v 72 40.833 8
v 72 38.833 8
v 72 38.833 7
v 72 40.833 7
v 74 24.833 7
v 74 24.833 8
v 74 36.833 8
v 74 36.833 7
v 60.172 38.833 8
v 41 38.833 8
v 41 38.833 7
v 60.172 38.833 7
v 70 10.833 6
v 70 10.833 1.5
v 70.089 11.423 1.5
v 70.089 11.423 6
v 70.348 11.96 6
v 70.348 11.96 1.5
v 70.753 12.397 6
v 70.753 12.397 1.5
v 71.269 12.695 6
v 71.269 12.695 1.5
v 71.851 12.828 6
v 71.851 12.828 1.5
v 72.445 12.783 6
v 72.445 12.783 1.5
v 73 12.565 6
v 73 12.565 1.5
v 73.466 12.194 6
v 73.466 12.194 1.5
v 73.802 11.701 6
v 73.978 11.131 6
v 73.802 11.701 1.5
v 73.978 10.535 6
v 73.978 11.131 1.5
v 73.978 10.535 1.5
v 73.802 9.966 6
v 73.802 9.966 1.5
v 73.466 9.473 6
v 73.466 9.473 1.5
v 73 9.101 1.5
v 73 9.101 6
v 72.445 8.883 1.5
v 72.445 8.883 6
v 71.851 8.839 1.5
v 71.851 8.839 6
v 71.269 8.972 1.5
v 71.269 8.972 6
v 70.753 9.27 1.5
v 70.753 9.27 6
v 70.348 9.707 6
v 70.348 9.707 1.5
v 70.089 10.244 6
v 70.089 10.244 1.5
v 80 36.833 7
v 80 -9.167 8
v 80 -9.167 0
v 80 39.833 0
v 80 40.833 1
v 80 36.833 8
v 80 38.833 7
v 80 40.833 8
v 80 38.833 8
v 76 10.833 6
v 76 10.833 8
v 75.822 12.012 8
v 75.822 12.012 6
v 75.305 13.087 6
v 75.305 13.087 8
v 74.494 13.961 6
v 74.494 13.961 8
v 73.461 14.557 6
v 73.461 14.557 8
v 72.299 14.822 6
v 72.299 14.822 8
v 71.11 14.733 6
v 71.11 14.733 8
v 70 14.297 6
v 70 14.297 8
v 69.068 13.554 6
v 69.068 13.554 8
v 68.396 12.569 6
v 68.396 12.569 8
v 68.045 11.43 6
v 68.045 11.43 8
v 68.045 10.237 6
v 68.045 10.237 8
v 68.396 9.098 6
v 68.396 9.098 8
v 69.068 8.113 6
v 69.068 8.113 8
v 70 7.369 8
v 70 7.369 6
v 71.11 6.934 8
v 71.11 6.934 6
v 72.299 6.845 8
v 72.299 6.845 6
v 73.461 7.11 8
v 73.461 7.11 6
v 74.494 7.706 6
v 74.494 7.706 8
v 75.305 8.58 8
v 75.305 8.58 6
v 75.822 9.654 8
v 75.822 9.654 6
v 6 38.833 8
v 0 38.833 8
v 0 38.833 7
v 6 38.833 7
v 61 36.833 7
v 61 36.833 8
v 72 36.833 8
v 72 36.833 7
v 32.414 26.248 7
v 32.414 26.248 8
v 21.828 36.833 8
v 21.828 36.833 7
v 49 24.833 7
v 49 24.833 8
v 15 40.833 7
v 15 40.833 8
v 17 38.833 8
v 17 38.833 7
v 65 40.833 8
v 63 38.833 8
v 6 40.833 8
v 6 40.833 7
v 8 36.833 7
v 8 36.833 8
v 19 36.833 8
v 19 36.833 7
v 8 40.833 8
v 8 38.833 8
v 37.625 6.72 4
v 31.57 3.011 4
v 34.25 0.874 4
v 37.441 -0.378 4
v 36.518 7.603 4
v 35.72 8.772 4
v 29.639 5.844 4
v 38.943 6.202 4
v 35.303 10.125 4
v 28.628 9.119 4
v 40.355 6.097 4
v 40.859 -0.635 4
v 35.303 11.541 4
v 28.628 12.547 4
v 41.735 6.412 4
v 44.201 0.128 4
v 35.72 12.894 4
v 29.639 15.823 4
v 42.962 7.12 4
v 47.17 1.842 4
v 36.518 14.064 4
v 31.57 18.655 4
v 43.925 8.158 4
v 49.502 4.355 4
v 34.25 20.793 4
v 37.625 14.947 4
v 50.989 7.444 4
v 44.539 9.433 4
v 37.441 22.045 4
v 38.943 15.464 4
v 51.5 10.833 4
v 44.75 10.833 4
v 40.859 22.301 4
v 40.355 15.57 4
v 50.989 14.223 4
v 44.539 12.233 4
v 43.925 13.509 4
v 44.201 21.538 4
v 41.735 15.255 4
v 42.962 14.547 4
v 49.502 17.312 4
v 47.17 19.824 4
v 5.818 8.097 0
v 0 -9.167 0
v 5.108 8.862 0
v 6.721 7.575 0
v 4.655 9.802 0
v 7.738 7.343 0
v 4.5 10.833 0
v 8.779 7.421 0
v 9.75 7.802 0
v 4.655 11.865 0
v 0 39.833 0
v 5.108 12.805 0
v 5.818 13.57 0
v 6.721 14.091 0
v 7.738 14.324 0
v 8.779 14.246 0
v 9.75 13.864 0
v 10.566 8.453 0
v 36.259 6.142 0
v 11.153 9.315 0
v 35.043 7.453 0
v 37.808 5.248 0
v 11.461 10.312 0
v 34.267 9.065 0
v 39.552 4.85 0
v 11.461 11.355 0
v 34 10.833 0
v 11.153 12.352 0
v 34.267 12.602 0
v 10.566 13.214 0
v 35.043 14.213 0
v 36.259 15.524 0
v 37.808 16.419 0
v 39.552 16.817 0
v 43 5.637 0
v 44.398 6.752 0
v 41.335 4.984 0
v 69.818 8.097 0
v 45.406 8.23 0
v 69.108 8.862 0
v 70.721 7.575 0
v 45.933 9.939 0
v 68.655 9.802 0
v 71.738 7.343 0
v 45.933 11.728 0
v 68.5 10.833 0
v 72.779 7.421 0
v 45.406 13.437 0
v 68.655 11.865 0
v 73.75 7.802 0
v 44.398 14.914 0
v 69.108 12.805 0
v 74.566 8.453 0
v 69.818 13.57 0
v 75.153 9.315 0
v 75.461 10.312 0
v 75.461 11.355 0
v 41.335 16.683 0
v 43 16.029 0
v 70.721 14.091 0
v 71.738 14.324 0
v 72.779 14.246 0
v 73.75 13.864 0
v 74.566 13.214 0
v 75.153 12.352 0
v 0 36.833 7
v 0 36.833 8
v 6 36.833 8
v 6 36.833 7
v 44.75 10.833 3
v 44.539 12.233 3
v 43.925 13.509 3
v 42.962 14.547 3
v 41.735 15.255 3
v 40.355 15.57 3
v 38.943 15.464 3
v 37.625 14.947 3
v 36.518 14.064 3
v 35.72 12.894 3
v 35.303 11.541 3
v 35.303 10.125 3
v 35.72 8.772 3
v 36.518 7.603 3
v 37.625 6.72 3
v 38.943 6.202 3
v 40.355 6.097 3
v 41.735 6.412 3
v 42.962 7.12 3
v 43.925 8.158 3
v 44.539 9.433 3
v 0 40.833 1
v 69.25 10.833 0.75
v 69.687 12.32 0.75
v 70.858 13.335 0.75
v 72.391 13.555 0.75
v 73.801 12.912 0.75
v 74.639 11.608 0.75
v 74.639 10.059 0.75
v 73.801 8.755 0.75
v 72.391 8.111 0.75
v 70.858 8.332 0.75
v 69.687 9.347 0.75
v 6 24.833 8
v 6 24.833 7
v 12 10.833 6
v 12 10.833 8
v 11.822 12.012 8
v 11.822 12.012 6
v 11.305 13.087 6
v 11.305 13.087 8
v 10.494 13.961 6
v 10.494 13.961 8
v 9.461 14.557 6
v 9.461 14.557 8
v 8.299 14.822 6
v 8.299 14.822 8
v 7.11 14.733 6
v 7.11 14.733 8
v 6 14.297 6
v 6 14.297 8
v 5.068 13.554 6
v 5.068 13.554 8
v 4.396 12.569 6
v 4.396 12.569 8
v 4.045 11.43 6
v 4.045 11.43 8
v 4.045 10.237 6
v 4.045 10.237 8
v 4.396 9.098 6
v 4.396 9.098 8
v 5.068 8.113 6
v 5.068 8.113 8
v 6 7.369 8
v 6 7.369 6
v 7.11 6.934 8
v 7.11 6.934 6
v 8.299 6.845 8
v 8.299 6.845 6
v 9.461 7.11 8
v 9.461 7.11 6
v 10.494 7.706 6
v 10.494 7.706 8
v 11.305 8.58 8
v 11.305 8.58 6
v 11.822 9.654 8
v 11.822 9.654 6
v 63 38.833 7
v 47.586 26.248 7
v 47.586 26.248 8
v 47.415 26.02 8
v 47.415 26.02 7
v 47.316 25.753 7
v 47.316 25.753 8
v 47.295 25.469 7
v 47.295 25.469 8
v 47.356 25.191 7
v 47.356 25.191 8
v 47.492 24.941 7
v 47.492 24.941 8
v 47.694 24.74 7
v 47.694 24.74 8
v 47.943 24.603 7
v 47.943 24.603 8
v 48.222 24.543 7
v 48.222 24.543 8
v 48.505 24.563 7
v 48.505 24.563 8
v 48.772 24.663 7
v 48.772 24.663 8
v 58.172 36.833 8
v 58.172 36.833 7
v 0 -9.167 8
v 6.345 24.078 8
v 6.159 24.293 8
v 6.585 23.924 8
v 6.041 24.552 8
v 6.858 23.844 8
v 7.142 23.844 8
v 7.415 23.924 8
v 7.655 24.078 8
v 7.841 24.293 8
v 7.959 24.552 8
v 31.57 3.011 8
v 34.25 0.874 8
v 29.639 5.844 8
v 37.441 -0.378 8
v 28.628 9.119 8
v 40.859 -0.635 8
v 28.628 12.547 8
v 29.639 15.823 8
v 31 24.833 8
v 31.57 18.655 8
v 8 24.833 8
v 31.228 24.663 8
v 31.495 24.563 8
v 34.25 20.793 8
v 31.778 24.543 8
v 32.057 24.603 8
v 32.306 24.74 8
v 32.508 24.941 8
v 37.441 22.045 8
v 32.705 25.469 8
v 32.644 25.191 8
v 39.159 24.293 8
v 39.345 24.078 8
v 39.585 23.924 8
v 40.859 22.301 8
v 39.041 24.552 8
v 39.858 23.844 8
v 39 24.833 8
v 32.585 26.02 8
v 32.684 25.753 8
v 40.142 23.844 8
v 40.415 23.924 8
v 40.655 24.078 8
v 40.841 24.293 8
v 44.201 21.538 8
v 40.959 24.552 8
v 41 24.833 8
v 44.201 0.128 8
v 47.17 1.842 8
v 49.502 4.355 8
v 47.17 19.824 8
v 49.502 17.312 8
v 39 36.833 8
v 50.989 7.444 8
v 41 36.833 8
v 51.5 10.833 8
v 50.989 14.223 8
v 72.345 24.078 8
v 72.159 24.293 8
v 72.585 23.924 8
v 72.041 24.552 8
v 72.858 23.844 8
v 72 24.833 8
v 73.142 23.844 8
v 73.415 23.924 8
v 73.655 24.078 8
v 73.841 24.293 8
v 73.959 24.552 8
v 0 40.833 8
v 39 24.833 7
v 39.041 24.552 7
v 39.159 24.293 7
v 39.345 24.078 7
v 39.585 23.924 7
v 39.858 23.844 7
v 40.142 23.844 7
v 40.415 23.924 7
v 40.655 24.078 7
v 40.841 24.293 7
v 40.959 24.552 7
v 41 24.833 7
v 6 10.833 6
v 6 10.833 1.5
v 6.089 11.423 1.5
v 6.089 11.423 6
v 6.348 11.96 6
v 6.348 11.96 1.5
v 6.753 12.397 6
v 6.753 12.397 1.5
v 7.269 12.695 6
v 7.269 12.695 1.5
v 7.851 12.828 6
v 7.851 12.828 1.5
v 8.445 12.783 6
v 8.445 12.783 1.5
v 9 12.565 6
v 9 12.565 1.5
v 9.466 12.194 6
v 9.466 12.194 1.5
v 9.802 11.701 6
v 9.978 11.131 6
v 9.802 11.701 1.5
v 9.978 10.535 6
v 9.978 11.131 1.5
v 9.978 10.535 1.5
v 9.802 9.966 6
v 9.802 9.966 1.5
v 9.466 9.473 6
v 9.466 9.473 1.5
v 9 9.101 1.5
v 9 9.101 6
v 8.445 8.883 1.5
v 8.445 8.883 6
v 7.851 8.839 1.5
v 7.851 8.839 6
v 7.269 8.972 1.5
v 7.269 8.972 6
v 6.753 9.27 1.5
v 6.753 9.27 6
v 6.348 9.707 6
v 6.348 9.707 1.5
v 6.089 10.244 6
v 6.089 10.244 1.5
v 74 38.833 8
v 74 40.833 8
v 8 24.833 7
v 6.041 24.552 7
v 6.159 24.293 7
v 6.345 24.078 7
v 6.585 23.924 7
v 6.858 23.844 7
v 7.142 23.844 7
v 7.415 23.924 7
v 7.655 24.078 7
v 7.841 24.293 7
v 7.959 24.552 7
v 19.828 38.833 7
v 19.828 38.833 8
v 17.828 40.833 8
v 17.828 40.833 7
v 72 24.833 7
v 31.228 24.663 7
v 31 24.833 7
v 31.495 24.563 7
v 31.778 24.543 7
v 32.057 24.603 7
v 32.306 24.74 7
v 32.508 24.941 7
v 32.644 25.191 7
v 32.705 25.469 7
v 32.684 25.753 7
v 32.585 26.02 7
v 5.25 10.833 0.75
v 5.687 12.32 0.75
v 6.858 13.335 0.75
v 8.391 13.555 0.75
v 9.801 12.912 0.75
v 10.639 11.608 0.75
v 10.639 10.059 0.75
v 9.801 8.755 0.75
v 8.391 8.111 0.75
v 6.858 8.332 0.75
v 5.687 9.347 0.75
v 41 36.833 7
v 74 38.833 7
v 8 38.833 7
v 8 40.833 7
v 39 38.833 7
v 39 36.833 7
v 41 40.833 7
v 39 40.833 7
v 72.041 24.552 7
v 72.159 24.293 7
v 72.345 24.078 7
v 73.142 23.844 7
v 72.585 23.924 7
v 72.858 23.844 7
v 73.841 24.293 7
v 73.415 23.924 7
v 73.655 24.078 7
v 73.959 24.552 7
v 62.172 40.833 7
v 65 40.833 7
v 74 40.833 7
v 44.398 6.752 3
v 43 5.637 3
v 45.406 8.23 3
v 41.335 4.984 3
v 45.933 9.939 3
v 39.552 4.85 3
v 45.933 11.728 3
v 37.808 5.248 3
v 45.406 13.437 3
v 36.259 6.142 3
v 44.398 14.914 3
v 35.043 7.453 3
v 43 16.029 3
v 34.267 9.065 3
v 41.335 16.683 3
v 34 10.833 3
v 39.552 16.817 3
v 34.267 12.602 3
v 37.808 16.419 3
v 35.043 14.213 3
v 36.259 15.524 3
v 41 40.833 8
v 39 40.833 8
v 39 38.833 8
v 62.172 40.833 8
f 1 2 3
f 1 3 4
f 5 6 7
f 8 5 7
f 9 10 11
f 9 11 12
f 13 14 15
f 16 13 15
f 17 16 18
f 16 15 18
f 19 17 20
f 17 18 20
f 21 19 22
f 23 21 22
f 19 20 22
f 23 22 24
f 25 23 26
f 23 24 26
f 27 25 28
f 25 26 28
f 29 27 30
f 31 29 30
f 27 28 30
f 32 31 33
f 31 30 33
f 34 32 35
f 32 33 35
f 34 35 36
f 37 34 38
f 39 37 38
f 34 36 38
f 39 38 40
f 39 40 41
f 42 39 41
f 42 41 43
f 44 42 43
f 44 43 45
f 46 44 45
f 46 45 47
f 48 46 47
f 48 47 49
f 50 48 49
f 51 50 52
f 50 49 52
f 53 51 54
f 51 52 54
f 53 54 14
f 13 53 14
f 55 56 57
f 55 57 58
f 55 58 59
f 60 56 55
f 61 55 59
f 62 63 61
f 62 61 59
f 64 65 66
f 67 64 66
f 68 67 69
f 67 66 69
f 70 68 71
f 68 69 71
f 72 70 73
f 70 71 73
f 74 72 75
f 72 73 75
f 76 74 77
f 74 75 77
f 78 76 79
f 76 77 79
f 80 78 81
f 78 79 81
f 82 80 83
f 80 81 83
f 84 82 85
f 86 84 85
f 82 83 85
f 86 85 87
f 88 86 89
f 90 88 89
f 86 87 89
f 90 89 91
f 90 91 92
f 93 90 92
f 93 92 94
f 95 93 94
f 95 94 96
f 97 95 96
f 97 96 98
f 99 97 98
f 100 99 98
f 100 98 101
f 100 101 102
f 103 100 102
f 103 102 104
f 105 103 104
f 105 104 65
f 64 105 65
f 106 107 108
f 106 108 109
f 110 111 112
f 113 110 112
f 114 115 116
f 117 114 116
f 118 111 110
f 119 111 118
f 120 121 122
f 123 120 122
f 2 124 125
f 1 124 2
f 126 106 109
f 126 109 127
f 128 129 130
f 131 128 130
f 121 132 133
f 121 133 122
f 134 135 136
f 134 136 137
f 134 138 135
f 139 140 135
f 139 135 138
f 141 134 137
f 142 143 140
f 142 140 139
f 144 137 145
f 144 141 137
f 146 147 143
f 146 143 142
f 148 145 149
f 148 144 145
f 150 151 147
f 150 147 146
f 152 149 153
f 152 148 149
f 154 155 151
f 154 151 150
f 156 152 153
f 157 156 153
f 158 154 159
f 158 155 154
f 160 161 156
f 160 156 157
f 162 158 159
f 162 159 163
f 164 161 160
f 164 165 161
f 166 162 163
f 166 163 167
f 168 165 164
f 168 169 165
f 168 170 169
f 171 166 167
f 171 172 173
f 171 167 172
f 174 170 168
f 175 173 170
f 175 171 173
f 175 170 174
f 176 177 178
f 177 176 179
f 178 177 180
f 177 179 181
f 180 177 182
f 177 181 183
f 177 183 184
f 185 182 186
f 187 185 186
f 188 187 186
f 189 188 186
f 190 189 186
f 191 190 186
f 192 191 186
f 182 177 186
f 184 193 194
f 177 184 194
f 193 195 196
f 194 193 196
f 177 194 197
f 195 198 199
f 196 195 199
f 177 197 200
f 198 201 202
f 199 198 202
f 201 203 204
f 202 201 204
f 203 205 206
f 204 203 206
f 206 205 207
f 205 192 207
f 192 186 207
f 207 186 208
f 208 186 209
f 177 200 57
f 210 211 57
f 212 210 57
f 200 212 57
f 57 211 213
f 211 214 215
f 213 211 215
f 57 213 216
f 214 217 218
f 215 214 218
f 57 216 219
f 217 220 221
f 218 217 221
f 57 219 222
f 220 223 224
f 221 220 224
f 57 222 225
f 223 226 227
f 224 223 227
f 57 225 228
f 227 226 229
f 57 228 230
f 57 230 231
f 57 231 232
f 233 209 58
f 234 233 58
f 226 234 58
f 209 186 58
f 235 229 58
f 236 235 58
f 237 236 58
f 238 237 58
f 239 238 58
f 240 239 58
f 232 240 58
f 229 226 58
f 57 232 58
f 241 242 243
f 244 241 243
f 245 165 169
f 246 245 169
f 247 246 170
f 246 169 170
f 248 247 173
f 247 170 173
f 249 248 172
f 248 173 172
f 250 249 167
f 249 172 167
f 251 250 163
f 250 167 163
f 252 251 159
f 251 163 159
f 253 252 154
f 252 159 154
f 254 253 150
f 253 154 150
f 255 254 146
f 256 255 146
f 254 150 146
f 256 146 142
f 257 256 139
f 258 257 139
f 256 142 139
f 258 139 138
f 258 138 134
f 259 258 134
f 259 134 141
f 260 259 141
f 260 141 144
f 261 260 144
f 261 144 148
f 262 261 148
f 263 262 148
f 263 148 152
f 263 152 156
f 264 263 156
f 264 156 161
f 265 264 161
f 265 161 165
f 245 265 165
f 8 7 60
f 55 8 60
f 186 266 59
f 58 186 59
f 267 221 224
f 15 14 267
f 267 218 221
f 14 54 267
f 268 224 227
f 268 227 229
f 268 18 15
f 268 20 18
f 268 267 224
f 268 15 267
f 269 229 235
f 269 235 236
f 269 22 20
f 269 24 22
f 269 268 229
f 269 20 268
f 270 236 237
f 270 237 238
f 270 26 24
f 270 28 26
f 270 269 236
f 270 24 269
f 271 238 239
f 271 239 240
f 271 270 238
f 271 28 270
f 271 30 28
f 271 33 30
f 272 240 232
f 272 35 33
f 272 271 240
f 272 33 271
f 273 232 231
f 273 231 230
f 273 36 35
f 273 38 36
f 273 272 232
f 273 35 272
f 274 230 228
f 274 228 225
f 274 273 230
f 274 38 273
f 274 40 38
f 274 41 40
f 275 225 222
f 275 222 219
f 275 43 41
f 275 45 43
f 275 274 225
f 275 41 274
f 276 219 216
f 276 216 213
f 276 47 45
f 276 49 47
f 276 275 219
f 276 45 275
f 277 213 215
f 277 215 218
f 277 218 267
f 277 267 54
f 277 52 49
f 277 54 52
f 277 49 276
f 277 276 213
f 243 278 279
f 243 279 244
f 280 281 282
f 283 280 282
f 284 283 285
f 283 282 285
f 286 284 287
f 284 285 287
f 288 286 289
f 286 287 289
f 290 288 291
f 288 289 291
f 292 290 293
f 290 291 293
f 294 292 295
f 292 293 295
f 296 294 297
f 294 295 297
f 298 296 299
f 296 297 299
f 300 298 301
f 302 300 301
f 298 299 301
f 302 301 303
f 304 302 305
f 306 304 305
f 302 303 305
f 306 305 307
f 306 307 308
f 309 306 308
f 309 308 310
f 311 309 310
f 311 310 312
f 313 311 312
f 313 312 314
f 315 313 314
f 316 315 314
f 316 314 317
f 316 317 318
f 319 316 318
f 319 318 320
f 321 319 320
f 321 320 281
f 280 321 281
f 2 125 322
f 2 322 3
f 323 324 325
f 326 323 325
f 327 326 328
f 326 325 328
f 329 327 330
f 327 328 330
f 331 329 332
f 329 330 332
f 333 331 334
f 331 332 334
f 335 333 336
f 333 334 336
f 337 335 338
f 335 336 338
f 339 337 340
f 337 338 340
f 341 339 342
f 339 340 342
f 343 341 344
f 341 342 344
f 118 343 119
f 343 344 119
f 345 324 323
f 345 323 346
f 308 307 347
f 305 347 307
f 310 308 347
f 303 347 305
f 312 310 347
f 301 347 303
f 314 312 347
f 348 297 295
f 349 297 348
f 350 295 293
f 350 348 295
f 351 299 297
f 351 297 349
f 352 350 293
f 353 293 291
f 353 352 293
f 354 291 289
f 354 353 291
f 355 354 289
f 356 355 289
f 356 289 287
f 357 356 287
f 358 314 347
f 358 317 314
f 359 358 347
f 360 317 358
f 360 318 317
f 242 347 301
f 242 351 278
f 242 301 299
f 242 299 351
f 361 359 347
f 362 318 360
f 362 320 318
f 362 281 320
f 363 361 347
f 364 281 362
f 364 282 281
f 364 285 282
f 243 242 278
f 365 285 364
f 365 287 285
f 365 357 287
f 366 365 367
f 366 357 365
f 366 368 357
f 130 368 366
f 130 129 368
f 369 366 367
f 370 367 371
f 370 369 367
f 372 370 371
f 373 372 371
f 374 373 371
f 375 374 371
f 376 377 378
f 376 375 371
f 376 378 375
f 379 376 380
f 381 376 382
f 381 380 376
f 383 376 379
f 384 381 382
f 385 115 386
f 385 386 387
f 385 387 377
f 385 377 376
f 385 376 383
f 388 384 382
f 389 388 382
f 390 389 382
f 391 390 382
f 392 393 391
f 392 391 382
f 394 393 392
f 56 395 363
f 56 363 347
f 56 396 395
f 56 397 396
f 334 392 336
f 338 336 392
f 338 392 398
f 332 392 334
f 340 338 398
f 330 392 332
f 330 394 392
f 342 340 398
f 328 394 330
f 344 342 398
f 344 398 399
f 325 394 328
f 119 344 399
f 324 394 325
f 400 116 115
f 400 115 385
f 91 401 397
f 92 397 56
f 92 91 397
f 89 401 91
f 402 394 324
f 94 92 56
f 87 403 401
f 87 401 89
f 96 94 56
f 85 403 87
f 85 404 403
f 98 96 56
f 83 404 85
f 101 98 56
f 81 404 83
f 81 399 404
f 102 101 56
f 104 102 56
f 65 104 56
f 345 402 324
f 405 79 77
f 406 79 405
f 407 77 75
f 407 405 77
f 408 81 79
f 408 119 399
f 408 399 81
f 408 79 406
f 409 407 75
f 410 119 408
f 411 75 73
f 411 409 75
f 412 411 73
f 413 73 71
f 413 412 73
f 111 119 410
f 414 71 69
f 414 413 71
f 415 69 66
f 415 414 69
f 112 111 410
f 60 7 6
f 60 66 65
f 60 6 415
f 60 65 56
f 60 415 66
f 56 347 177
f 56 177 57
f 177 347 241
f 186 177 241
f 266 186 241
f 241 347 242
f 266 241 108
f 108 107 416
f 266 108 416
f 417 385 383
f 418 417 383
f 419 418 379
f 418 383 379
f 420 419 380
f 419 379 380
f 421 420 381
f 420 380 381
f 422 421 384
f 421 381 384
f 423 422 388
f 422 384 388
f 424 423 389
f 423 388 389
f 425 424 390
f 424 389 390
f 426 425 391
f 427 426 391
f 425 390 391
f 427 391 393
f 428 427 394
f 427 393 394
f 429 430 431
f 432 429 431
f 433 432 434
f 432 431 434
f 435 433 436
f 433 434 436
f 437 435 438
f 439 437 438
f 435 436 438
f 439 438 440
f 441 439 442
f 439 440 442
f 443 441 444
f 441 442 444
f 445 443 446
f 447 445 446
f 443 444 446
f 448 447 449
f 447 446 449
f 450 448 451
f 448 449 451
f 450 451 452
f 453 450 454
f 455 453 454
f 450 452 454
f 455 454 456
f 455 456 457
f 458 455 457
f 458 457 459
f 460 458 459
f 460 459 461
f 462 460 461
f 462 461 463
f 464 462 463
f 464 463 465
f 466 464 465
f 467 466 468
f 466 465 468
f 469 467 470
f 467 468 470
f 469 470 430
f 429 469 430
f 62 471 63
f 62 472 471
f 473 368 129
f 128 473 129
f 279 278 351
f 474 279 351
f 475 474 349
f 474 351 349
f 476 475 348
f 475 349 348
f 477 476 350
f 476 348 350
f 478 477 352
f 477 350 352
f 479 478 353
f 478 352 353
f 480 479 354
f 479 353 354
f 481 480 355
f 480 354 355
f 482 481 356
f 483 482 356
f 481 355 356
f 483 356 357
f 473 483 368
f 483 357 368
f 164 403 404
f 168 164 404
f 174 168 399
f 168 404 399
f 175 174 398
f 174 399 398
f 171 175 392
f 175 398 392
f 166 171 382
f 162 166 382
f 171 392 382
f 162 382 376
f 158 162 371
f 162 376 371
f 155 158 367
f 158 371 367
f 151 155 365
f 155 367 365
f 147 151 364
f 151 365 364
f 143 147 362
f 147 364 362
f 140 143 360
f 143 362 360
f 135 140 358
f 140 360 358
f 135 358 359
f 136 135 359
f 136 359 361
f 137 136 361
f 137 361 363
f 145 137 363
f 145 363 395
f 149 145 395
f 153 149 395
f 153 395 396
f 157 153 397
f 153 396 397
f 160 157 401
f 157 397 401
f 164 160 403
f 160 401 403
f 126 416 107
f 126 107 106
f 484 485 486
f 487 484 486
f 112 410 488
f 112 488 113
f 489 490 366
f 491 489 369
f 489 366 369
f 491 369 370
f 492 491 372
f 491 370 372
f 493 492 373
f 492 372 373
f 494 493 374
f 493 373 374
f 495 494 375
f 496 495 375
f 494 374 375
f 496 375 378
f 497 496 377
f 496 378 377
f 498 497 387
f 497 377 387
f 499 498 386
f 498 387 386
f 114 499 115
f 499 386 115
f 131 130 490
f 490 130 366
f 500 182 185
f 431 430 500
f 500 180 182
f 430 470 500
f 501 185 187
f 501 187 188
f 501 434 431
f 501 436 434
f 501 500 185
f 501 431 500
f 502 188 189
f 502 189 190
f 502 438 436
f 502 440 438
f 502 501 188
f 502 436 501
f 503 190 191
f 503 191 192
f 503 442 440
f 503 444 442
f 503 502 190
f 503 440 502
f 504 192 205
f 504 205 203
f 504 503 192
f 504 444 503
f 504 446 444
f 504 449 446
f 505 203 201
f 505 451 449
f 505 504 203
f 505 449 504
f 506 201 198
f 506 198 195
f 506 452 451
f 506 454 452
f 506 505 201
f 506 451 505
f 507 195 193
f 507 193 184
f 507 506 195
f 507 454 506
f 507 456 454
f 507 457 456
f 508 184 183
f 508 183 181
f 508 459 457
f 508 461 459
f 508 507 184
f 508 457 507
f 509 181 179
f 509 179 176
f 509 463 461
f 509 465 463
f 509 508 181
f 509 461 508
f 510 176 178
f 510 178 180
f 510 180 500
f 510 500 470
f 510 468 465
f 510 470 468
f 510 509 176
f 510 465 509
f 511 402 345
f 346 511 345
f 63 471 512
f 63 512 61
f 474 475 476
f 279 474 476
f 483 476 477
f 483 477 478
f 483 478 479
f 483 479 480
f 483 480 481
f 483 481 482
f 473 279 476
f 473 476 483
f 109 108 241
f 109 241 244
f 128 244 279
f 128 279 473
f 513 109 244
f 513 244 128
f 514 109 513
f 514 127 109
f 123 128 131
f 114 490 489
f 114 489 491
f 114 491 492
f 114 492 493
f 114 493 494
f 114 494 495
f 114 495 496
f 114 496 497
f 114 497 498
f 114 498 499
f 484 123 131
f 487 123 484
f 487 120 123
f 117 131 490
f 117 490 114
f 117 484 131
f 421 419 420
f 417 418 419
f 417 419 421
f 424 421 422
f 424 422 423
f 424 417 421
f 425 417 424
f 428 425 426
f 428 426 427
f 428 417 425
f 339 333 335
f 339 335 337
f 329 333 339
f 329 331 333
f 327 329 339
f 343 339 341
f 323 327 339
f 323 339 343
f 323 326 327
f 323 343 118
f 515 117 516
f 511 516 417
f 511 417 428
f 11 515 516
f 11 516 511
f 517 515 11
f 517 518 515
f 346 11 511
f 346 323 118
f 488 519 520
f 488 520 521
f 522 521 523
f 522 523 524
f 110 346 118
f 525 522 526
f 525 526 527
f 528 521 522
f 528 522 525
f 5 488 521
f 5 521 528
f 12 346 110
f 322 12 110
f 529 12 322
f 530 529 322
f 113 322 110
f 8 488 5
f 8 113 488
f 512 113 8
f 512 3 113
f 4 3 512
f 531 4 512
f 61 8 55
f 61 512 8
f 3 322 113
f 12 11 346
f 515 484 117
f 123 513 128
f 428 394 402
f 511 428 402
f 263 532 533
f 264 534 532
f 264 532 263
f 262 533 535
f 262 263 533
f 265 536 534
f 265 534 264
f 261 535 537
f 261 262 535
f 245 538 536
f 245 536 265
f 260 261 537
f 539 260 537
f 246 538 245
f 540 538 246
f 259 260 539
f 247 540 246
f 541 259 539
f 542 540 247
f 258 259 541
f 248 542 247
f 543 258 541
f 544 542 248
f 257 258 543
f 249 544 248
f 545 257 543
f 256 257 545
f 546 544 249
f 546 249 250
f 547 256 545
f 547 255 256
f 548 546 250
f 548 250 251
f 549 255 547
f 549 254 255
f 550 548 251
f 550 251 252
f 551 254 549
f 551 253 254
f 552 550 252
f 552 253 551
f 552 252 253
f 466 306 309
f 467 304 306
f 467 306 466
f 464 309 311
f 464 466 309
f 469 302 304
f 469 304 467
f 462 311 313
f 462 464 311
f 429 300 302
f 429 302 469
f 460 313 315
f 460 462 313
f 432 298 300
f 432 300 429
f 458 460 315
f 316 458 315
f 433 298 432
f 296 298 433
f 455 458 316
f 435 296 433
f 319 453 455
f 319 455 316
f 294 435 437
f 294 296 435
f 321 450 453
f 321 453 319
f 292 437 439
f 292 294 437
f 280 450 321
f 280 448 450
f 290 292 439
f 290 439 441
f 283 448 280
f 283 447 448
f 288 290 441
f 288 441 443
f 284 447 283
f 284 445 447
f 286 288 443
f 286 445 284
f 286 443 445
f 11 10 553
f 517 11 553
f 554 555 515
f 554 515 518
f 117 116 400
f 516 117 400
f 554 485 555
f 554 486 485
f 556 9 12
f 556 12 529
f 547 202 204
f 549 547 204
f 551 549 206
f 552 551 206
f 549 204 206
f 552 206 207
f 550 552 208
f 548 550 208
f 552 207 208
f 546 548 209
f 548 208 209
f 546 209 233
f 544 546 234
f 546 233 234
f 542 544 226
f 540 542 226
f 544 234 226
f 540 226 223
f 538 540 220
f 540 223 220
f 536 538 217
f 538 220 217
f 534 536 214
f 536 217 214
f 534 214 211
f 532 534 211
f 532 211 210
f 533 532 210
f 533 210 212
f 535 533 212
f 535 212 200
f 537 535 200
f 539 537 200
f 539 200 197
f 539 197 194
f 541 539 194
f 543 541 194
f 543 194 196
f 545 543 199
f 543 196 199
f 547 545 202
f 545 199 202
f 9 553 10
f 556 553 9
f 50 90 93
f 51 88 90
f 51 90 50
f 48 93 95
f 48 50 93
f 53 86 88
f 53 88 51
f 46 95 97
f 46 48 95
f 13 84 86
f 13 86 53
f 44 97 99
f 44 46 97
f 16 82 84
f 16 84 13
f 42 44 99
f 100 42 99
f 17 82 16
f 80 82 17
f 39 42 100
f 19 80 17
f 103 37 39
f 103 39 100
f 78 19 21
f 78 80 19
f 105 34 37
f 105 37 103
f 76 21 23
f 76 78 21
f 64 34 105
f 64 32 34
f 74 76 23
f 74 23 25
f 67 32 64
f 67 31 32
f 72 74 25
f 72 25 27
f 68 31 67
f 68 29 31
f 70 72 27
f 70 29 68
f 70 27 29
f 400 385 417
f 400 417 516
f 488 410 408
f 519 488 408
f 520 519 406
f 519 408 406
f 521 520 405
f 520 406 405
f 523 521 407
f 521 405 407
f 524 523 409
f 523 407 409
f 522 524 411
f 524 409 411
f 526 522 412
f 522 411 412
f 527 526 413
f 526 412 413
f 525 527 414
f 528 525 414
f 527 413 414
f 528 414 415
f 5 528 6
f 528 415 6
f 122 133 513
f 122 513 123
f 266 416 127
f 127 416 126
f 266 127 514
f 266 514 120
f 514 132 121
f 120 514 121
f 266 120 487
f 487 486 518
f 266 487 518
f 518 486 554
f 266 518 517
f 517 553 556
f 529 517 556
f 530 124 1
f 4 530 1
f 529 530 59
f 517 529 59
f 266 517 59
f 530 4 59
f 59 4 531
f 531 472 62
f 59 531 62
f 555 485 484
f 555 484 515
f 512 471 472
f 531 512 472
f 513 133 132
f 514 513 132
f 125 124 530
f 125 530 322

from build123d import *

# Parameters (mm, degrees)
SKETCH_1_W                     = 80
SKETCH_1_H                     = 60
EXTRUDE_1_DEPTH                = 8
HOLE_WIZARD_M3_5_1_D           = 4
HOLE_WIZARD_M3_5_1_CBORE_D     = 8
HOLE_WIZARD_M3_5_1_CBORE_DEPTH = 2
SKETCH_14_W                    = 80
SKETCH_14_H                    = 2
SKETCH_14_W_2                  = 2
SKETCH_14_H_2                  = 16
CUT_EXTRUDE_1_DEPTH            = 1
CUT_EXTRUDE_2_REACH            = 92.174
SKETCH_15_R                    = 4.75
SKETCH_17_R                    = 11.5
CUT_EXTRUDE_4_DEPTH            = 4
SKETCH_18_R                    = 6
CUT_EXTRUDE_5_DEPTH            = 3
CHAMFER_1_SIZE                 = 1.499999999
CHAMFER_1_SIZE2                = 1.500000001
CHAMFER_2_SIZE                 = 1
SKETCH_20_W                    = 80
SKETCH_20_H                    = 6
CUT_EXTRUDE_6_DEPTH            = 1
SKETCH_21_W                    = 80
SKETCH_21_H                    = 4
CUT_EXTRUDE_7_DEPTH            = 1
SKETCH_22_W                    = 80
SKETCH_22_H                    = 2
CUT_EXTRUDE_8_DEPTH            = 1
SKETCH_23_R                    = 1
CUT_EXTRUDE_9_DEPTH            = 1
CUT_EXTRUDE_10_REACH           = 92.174
SKETCH_24_W                    = 80
SKETCH_24_H                    = 10


with BuildPart() as part:
    # 草图1 → 凸台-拉伸1 (new body)
    with BuildSketch(Plane.XY.offset(8)):
        with Locations((40, 10.833333333)):
            Rectangle(SKETCH_1_W, SKETCH_1_H)
    extrude(amount=-EXTRUDE_1_DEPTH)

    # M3.5 六角头机械螺钉的柱形沉头孔1 (through all)
    with Locations(Plane.XY.offset(8)):
        with Locations((8, 10.833333333), (72, 10.833333333)):
            CounterBoreHole(HOLE_WIZARD_M3_5_1_D / 2, HOLE_WIZARD_M3_5_1_CBORE_D / 2, HOLE_WIZARD_M3_5_1_CBORE_DEPTH)

    # 草图14 → 切除-拉伸1 (cut)
    with BuildSketch(Plane.XY.offset(8)):
        with Locations((40, 37.833333333)):
            Rectangle(SKETCH_14_W, SKETCH_14_H)
        Polygon((15, 40.833333333), (31, 24.833333333), (32.414213562, 26.247546896), (16.414213562, 42.247546896), align=None)
        with Locations((7, 32.833333333)):
            Rectangle(SKETCH_14_W_2, SKETCH_14_H_2)
        with Locations((40, 32.833333333)):
            Rectangle(SKETCH_14_W_2, SKETCH_14_H_2)
        with Locations((73, 32.833333333)):
            Rectangle(SKETCH_14_W_2, SKETCH_14_H_2)
        Polygon((47.585786438, 26.247546896), (63.585786438, 42.247546896), (65, 40.833333333), (49, 24.833333333), align=None)
    extrude(amount=-CUT_EXTRUDE_1_DEPTH, mode=Mode.SUBTRACT)

    # 草图15 → 切除-拉伸2 (cut, up to next)
    with BuildSketch(Plane.XY.offset(8), mode=Mode.PRIVATE) as cut_extrude_2_sk1:
        with Locations((40, 10.833333333)):
            Circle(SKETCH_15_R)
    cut_extrude_2_tool1 = extrude(cut_extrude_2_sk1.sketch, amount=-CUT_EXTRUDE_2_REACH, mode=Mode.PRIVATE) & part.part
    add(cut_extrude_2_tool1.solids().sort_by_distance((40, 10.833333, 8))[0], mode=Mode.SUBTRACT)

    # 草图17 → 切除-拉伸4 (cut)
    with BuildSketch(Plane.XY.offset(8)):
        with Locations((40, 10.833333333)):
            Circle(SKETCH_17_R)
    extrude(amount=-CUT_EXTRUDE_4_DEPTH, mode=Mode.SUBTRACT)

    # 草图18 → 切除-拉伸5 (cut)
    with BuildSketch(Plane(origin=(0, 0, 0), x_dir=(-1, 0, 0), z_dir=(0, 0, -1))):
        with Locations((-40, 10.833333333)):
            Circle(SKETCH_18_R)
    extrude(amount=-CUT_EXTRUDE_5_DEPTH, mode=Mode.SUBTRACT)

    # 倒角1
    chamfer_1_edges = [part.edges().sort_by_distance(p)[0] for p in [
        (74, 10.833333333, 0),
        (10, 10.833333333, 0),
    ]]
    chamfer_1_side = [part.faces().sort_by_distance(p)[0] for p in [
        (79, 10.833333333, 0),
    ]]
    chamfer(chamfer_1_edges, length=CHAMFER_1_SIZE, length2=CHAMFER_1_SIZE2, reference=chamfer_1_side[0])

    # 倒角2
    chamfer_2_edges = [part.edges().sort_by_distance(p)[0] for p in [
        (40, 40.833333333, 0),
    ]]
    chamfer(chamfer_2_edges, length=CHAMFER_2_SIZE)

    # 草图20 → 切除-拉伸6 (cut)
    with BuildSketch(Plane.XY.offset(8)):
        with Locations((40, -16.166666667)):
            Rectangle(SKETCH_20_W, SKETCH_20_H)
    extrude(amount=-CUT_EXTRUDE_6_DEPTH, mode=Mode.SUBTRACT)

    # 草图21 → 切除-拉伸7 (cut)
    with BuildSketch(Plane.XY.offset(7)):
        with Locations((40, -17.166666667)):
            Rectangle(SKETCH_21_W, SKETCH_21_H)
    extrude(amount=-CUT_EXTRUDE_7_DEPTH, mode=Mode.SUBTRACT)

    # 草图22 → 切除-拉伸8 (cut)
    with BuildSketch(Plane.XY.offset(6)):
        with Locations((40, -18.166666667)):
            Rectangle(SKETCH_22_W, SKETCH_22_H)
    extrude(amount=-CUT_EXTRUDE_8_DEPTH, mode=Mode.SUBTRACT)

    # 草图23 → 切除-拉伸9 (cut)
    with BuildSketch(Plane.XY.offset(8)):
        with Locations((7, 24.833333333)):
            Circle(SKETCH_23_R)
        with Locations((31.707106781, 25.540440115)):
            Circle(SKETCH_23_R)
        with Locations((40, 24.833333333)):
            Circle(SKETCH_23_R)
        with Locations((48.292893219, 25.540440115)):
            Circle(SKETCH_23_R)
        with Locations((73, 24.833333333)):
            Circle(SKETCH_23_R)
    extrude(amount=-CUT_EXTRUDE_9_DEPTH, mode=Mode.SUBTRACT)

    # 草图24 → 切除-拉伸10 (cut, up to next)
    with BuildSketch(Plane.XY.offset(8), mode=Mode.PRIVATE) as cut_extrude_10_sk1:
        with Locations((40, -14.166666667)):
            Rectangle(SKETCH_24_W, SKETCH_24_H)
    cut_extrude_10_tool1 = extrude(cut_extrude_10_sk1.sketch, amount=-CUT_EXTRUDE_10_REACH, mode=Mode.PRIVATE) & part.part
    add(cut_extrude_10_tool1.solids().sort_by_distance((40, -14.166667, 8))[0], mode=Mode.SUBTRACT)


solid = part.part
